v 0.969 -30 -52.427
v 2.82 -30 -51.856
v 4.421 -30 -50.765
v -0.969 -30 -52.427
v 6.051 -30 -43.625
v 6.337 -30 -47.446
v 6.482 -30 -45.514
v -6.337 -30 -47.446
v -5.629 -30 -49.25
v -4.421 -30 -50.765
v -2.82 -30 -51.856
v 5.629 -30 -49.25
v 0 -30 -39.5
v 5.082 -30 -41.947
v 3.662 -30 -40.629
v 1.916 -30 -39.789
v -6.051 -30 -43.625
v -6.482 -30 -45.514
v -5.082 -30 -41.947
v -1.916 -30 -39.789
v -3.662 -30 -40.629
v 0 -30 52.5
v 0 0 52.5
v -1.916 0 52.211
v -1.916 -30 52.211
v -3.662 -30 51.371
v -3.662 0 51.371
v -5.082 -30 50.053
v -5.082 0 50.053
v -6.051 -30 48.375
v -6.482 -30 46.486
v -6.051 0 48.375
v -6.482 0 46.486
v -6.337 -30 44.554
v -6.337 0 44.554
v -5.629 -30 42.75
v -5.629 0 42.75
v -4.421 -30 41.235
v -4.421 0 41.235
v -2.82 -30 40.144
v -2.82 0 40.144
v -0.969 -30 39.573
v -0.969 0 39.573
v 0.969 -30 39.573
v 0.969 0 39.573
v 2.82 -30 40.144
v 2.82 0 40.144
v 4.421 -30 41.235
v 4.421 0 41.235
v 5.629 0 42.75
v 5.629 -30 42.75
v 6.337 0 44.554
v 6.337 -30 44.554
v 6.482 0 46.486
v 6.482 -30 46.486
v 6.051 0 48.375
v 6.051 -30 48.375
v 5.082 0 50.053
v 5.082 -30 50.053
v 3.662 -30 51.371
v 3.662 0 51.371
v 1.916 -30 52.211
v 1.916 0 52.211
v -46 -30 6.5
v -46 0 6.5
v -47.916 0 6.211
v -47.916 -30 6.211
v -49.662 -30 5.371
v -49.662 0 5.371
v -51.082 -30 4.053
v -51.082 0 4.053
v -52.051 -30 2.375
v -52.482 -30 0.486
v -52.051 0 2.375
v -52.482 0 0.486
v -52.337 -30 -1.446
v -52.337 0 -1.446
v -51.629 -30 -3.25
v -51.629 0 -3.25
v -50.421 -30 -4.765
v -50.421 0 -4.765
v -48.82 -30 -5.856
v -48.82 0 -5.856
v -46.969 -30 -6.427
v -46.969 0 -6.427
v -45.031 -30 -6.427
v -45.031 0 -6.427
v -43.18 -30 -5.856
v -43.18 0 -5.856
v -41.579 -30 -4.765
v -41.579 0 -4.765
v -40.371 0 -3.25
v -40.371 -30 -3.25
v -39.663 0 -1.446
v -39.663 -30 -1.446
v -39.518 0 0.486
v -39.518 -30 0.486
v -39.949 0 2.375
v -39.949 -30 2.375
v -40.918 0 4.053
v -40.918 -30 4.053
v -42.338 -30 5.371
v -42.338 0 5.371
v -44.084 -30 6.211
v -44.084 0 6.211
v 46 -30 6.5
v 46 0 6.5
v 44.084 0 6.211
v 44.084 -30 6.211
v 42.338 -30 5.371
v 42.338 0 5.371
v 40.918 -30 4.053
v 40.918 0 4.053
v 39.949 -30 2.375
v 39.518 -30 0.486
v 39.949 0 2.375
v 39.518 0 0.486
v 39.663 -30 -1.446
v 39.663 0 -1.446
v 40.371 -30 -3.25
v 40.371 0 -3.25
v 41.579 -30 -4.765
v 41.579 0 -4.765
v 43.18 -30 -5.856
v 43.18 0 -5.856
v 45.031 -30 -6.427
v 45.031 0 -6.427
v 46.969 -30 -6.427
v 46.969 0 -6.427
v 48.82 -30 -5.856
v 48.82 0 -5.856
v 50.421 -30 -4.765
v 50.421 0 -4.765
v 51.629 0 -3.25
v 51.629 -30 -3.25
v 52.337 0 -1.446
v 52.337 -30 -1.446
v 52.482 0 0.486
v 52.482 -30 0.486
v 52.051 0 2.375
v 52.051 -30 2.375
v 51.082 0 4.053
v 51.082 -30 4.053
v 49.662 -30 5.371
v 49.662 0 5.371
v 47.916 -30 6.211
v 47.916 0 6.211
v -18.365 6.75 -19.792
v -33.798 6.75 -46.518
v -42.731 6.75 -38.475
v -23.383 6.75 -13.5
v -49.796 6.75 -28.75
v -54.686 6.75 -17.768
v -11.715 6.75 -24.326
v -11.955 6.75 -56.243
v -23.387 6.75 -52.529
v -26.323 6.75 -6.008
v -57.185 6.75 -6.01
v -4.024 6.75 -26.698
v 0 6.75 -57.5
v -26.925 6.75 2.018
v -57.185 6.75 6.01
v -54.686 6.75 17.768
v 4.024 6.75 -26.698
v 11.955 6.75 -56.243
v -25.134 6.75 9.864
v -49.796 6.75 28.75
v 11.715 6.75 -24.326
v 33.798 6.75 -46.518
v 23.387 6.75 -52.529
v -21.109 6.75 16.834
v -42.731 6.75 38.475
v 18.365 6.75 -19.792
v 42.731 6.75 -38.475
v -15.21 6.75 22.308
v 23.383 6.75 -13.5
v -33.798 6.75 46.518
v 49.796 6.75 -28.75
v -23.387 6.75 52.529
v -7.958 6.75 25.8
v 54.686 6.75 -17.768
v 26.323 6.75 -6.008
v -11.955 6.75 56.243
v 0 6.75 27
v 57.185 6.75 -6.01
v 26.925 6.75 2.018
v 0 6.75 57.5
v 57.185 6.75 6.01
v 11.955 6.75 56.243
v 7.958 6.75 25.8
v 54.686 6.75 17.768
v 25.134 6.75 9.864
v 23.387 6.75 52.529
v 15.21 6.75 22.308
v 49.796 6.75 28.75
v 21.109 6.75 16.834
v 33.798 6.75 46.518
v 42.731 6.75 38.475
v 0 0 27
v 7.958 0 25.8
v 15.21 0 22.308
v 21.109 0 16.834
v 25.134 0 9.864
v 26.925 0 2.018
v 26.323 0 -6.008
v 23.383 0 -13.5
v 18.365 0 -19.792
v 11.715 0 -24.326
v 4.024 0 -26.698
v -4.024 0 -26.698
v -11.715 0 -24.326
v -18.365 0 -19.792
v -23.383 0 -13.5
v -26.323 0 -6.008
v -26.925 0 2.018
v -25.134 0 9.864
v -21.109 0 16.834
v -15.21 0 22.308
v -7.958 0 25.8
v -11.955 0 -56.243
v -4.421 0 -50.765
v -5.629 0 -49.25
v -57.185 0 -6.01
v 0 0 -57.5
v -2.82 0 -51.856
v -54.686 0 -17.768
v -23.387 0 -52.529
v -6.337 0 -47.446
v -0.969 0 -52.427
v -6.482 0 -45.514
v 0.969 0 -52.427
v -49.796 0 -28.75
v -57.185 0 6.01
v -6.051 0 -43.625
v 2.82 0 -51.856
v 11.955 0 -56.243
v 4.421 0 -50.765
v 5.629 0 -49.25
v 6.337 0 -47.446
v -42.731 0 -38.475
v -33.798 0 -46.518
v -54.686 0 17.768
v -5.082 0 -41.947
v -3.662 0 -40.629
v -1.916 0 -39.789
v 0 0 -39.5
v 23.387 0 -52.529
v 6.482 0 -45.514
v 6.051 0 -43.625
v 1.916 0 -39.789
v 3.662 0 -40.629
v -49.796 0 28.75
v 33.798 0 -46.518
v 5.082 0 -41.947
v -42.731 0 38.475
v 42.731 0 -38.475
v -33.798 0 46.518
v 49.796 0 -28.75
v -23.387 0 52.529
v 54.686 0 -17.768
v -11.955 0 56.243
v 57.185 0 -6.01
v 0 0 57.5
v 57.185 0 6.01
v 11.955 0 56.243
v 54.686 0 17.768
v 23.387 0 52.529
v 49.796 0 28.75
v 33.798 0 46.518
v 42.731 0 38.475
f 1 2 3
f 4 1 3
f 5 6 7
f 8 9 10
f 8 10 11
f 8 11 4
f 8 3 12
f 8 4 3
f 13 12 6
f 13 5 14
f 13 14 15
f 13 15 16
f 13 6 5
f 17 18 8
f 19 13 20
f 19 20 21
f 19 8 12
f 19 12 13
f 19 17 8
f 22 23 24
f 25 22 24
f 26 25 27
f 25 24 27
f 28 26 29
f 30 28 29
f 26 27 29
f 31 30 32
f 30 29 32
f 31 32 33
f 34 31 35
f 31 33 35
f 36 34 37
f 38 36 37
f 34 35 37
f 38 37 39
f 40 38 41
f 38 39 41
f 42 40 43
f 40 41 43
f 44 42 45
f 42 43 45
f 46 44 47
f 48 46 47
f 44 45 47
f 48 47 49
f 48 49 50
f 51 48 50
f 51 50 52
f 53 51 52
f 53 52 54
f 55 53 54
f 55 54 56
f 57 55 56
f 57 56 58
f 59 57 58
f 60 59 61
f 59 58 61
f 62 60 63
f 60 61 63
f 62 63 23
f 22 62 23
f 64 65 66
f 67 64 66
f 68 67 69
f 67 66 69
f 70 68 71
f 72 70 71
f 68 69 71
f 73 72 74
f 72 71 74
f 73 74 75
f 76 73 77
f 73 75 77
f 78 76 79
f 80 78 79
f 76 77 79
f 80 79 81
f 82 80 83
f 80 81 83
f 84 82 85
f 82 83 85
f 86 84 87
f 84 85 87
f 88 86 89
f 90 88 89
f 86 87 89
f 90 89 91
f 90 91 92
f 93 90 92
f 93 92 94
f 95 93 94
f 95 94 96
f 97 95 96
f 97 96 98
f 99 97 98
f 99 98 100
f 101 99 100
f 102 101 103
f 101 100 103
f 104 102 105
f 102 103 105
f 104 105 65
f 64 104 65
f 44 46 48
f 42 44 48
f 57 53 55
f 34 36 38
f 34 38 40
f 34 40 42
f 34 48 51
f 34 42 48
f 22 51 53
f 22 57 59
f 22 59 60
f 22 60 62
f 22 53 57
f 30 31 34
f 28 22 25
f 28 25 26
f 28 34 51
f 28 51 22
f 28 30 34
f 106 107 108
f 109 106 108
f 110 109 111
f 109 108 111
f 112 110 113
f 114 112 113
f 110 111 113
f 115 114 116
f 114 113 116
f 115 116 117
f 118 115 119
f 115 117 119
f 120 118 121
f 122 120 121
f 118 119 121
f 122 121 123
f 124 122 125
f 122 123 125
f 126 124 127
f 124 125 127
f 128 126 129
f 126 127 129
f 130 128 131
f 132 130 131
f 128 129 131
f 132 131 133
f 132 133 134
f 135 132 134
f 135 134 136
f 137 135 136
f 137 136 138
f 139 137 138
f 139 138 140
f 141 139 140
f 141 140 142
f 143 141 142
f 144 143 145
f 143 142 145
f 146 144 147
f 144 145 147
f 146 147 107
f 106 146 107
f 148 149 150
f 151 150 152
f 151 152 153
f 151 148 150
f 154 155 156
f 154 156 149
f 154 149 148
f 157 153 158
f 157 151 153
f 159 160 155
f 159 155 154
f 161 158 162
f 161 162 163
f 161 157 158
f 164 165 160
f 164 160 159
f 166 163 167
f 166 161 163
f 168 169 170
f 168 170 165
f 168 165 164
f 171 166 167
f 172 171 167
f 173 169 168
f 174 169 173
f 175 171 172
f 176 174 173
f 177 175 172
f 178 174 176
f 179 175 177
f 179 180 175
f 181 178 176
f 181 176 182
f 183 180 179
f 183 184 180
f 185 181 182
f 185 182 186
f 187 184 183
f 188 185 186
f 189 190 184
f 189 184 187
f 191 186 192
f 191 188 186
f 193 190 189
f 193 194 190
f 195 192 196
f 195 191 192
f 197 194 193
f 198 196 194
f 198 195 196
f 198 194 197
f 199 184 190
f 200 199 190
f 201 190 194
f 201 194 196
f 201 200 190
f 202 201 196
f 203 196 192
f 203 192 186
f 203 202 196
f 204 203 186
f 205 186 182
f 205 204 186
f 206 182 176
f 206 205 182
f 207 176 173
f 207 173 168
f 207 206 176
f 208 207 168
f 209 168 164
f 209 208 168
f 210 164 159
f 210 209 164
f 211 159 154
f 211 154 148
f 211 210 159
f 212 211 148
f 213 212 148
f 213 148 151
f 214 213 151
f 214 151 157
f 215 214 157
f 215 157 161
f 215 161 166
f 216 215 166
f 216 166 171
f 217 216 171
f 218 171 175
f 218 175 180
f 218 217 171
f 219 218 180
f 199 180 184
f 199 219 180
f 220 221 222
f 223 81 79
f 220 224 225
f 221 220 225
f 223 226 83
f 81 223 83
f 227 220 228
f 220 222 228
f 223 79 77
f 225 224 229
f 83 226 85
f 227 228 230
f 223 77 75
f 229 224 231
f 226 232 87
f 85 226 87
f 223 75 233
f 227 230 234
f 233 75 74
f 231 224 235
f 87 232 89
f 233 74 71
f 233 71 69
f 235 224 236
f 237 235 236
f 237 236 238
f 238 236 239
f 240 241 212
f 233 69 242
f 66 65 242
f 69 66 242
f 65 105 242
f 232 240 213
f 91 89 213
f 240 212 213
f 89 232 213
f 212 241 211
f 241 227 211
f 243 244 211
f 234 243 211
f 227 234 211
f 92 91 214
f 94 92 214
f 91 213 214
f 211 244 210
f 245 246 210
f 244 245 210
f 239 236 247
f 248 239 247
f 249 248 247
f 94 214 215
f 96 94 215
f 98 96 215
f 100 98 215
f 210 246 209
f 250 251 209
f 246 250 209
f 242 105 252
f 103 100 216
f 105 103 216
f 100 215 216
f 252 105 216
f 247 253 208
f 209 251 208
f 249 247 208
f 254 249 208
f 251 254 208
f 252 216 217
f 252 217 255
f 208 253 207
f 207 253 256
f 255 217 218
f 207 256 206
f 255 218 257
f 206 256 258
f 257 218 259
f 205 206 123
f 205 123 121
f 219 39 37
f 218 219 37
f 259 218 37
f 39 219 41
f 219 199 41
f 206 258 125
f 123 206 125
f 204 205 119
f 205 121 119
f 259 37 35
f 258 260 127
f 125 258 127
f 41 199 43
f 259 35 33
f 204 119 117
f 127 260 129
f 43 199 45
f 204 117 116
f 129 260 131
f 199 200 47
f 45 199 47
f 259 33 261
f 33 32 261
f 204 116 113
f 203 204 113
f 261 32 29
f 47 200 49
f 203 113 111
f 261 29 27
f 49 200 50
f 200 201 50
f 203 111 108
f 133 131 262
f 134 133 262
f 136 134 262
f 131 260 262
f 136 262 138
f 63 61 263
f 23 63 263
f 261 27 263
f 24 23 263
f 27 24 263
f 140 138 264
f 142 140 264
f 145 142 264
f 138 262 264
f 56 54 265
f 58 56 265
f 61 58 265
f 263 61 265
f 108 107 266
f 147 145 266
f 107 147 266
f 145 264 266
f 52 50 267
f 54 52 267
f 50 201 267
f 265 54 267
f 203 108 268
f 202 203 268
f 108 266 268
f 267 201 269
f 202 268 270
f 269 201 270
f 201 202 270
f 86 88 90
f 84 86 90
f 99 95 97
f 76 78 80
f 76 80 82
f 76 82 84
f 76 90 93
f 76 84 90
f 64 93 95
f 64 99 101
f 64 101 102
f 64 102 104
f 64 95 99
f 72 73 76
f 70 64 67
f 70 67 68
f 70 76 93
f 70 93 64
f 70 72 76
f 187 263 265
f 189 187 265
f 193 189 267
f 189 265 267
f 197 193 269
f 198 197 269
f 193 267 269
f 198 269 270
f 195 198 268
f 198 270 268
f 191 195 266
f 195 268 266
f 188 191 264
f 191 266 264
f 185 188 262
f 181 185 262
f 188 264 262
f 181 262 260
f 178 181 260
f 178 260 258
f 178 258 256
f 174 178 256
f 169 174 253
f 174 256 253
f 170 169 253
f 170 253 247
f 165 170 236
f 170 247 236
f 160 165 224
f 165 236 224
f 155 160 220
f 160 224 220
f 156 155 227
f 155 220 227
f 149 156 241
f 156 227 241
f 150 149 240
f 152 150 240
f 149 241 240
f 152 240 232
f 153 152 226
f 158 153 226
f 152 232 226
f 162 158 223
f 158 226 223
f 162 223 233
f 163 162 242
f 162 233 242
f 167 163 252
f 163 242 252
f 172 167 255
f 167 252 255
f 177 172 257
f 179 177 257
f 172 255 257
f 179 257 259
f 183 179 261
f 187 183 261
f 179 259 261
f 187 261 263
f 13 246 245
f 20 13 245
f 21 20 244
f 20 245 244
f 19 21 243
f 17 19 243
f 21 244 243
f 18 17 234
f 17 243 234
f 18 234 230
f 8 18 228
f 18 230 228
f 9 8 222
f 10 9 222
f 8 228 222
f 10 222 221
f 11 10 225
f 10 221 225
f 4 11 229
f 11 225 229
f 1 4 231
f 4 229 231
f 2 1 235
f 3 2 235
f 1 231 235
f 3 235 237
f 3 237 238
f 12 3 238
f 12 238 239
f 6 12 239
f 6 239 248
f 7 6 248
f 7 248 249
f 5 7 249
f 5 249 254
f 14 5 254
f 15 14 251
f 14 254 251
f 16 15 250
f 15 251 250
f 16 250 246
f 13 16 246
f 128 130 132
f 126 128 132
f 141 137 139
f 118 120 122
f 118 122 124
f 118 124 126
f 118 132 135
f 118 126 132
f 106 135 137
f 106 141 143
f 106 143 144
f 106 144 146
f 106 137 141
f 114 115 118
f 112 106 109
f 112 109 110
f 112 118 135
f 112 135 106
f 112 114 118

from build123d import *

# Parameters (mm, degrees)
SKETCH_1_R      = 57.5
SKETCH_1_R_2    = 27
EXTRUDE_2_DEPTH = 6.75
SKETCH_3_R      = 6.5
EXTRUDE_3_DEPTH = 30


with BuildPart() as part:
    # 草圖1 → 填料-伸長2 (new body)
    with BuildSketch(Plane(origin=(0, 0, 0), x_dir=(1, 0, 0), z_dir=(0, 1, 0))):
        with Locations(Location((0, 0, 0), (0, 0, 270))):
            Circle(SKETCH_1_R)
        with Locations(Location((0, 0, 0), (0, 0, 270))):
            Circle(SKETCH_1_R_2, mode=Mode.SUBTRACT)
    extrude(amount=EXTRUDE_2_DEPTH)

    # 草圖3 → 填料-伸長3 (add)
    with BuildSketch(Plane.XZ):
        with Locations(Location((0, 46, 0), (0, 0, 90))):
            Circle(SKETCH_3_R)
        with Locations(Location((0, -46, 0), (0, 0, 90))):
            Circle(SKETCH_3_R)
        with Locations(Location((-46, 0, 0), (0, 0, 90))):
            Circle(SKETCH_3_R)
        with Locations(Location((46, 0, 0), (0, 0, 90))):
            Circle(SKETCH_3_R)
    extrude(amount=EXTRUDE_3_DEPTH)


solid = part.part
